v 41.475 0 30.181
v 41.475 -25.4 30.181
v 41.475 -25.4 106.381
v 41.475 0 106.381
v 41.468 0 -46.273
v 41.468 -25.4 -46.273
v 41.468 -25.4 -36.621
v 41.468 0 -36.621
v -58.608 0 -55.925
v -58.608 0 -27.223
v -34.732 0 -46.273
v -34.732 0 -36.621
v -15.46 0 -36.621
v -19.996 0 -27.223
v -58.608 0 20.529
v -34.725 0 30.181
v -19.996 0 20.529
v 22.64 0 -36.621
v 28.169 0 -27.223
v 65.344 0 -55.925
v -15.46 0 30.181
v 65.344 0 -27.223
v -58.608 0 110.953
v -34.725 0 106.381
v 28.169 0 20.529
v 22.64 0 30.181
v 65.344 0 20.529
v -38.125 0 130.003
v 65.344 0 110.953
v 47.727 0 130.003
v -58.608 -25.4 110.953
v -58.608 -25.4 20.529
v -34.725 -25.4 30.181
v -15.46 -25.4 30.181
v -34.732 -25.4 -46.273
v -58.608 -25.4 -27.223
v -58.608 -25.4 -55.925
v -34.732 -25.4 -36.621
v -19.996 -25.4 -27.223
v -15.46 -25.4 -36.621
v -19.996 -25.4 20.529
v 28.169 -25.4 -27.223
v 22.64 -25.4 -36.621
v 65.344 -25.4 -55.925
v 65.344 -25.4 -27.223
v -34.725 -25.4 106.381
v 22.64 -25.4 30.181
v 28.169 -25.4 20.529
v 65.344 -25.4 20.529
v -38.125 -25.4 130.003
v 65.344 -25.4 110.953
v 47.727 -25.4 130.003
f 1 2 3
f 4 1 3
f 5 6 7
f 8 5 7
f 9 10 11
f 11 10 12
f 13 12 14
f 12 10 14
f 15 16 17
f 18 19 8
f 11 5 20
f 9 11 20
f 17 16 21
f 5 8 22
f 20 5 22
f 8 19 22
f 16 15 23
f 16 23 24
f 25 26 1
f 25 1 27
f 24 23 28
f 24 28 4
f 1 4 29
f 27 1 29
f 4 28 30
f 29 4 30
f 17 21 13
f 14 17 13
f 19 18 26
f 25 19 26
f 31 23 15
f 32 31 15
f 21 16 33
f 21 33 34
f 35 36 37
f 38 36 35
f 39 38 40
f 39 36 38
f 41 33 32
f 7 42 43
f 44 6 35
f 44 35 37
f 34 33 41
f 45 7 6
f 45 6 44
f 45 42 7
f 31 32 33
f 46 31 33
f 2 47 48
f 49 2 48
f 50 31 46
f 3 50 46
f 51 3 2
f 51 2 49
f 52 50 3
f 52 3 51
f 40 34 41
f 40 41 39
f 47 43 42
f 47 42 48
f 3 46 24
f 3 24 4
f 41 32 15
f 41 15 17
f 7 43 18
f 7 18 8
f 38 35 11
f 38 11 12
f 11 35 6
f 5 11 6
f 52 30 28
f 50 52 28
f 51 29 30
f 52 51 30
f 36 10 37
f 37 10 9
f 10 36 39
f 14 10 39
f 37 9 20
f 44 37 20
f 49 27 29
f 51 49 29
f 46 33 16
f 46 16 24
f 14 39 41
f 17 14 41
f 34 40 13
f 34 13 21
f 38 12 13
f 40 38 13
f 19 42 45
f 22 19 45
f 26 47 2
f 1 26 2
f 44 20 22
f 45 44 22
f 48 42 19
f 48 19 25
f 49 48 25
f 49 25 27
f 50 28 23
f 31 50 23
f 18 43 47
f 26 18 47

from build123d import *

# Parameters (mm, degrees)
F1_DEPTH = 25.4
F2_W     = 76.2
F2_H     = 9.652
F3_DEPTH = 25.4
F5_W     = 38.1
F5_H     = 66.802
F6_DEPTH = 25.4
F4_W     = 38.612633237
F4_H     = 47.752
F4_W_2   = 37.1750120858
F7_DEPTH = 25.4
F8_W     = 76.2
F8_H     = 76.2
F9_DEPTH = 25.4


with BuildPart() as f1:
    # F0 (on Front) → F1 (new body)
    with BuildSketch(Plane.XZ):
        Polygon((-58.6082313994, 110.9526419132), (-58.6082313994, -55.9253580868), (65.3437686006, -55.9253580868), (65.3437686006, 110.9526419132), (47.7265781481, 130.0026419132), (-38.1254218519, 130.0026419132), align=None)
    extrude(amount=F1_DEPTH)

    # F2 (on face) → F3 (cut)
    with BuildSketch(Plane.XZ.offset(25.4)):
        with Locations((3.3677686006, -41.4473580868)):
            Rectangle(F2_W, F2_H)
    extrude(amount=-F3_DEPTH, mode=Mode.SUBTRACT)

    # F5 (on face) → F6 (cut)
    with BuildSketch(Plane.XZ.offset(25.4)):
        with Locations((3.5901358351, -3.2203580868)):
            Rectangle(F5_W, F5_H)
    extrude(amount=-F6_DEPTH, mode=Mode.SUBTRACT)

    # F4 (on face) → F7 (cut)
    with BuildSketch(Plane.XZ.offset(25.4)):
        with Locations((-39.3019147809, -3.3473580868)):
            Rectangle(F4_W, F4_H)
        with Locations((46.7562625577, -3.3473580868)):
            Rectangle(F4_W_2, F4_H)
    extrude(amount=-F7_DEPTH, mode=Mode.SUBTRACT)

    # F8 (on face) → F9 (cut)
    with BuildSketch(Plane.XZ.offset(25.4)):
        with Locations((3.3754030544, 68.2806419132)):
            Rectangle(F8_W, F8_H)
    extrude(amount=-F9_DEPTH, mode=Mode.SUBTRACT)


solid = f1.part
